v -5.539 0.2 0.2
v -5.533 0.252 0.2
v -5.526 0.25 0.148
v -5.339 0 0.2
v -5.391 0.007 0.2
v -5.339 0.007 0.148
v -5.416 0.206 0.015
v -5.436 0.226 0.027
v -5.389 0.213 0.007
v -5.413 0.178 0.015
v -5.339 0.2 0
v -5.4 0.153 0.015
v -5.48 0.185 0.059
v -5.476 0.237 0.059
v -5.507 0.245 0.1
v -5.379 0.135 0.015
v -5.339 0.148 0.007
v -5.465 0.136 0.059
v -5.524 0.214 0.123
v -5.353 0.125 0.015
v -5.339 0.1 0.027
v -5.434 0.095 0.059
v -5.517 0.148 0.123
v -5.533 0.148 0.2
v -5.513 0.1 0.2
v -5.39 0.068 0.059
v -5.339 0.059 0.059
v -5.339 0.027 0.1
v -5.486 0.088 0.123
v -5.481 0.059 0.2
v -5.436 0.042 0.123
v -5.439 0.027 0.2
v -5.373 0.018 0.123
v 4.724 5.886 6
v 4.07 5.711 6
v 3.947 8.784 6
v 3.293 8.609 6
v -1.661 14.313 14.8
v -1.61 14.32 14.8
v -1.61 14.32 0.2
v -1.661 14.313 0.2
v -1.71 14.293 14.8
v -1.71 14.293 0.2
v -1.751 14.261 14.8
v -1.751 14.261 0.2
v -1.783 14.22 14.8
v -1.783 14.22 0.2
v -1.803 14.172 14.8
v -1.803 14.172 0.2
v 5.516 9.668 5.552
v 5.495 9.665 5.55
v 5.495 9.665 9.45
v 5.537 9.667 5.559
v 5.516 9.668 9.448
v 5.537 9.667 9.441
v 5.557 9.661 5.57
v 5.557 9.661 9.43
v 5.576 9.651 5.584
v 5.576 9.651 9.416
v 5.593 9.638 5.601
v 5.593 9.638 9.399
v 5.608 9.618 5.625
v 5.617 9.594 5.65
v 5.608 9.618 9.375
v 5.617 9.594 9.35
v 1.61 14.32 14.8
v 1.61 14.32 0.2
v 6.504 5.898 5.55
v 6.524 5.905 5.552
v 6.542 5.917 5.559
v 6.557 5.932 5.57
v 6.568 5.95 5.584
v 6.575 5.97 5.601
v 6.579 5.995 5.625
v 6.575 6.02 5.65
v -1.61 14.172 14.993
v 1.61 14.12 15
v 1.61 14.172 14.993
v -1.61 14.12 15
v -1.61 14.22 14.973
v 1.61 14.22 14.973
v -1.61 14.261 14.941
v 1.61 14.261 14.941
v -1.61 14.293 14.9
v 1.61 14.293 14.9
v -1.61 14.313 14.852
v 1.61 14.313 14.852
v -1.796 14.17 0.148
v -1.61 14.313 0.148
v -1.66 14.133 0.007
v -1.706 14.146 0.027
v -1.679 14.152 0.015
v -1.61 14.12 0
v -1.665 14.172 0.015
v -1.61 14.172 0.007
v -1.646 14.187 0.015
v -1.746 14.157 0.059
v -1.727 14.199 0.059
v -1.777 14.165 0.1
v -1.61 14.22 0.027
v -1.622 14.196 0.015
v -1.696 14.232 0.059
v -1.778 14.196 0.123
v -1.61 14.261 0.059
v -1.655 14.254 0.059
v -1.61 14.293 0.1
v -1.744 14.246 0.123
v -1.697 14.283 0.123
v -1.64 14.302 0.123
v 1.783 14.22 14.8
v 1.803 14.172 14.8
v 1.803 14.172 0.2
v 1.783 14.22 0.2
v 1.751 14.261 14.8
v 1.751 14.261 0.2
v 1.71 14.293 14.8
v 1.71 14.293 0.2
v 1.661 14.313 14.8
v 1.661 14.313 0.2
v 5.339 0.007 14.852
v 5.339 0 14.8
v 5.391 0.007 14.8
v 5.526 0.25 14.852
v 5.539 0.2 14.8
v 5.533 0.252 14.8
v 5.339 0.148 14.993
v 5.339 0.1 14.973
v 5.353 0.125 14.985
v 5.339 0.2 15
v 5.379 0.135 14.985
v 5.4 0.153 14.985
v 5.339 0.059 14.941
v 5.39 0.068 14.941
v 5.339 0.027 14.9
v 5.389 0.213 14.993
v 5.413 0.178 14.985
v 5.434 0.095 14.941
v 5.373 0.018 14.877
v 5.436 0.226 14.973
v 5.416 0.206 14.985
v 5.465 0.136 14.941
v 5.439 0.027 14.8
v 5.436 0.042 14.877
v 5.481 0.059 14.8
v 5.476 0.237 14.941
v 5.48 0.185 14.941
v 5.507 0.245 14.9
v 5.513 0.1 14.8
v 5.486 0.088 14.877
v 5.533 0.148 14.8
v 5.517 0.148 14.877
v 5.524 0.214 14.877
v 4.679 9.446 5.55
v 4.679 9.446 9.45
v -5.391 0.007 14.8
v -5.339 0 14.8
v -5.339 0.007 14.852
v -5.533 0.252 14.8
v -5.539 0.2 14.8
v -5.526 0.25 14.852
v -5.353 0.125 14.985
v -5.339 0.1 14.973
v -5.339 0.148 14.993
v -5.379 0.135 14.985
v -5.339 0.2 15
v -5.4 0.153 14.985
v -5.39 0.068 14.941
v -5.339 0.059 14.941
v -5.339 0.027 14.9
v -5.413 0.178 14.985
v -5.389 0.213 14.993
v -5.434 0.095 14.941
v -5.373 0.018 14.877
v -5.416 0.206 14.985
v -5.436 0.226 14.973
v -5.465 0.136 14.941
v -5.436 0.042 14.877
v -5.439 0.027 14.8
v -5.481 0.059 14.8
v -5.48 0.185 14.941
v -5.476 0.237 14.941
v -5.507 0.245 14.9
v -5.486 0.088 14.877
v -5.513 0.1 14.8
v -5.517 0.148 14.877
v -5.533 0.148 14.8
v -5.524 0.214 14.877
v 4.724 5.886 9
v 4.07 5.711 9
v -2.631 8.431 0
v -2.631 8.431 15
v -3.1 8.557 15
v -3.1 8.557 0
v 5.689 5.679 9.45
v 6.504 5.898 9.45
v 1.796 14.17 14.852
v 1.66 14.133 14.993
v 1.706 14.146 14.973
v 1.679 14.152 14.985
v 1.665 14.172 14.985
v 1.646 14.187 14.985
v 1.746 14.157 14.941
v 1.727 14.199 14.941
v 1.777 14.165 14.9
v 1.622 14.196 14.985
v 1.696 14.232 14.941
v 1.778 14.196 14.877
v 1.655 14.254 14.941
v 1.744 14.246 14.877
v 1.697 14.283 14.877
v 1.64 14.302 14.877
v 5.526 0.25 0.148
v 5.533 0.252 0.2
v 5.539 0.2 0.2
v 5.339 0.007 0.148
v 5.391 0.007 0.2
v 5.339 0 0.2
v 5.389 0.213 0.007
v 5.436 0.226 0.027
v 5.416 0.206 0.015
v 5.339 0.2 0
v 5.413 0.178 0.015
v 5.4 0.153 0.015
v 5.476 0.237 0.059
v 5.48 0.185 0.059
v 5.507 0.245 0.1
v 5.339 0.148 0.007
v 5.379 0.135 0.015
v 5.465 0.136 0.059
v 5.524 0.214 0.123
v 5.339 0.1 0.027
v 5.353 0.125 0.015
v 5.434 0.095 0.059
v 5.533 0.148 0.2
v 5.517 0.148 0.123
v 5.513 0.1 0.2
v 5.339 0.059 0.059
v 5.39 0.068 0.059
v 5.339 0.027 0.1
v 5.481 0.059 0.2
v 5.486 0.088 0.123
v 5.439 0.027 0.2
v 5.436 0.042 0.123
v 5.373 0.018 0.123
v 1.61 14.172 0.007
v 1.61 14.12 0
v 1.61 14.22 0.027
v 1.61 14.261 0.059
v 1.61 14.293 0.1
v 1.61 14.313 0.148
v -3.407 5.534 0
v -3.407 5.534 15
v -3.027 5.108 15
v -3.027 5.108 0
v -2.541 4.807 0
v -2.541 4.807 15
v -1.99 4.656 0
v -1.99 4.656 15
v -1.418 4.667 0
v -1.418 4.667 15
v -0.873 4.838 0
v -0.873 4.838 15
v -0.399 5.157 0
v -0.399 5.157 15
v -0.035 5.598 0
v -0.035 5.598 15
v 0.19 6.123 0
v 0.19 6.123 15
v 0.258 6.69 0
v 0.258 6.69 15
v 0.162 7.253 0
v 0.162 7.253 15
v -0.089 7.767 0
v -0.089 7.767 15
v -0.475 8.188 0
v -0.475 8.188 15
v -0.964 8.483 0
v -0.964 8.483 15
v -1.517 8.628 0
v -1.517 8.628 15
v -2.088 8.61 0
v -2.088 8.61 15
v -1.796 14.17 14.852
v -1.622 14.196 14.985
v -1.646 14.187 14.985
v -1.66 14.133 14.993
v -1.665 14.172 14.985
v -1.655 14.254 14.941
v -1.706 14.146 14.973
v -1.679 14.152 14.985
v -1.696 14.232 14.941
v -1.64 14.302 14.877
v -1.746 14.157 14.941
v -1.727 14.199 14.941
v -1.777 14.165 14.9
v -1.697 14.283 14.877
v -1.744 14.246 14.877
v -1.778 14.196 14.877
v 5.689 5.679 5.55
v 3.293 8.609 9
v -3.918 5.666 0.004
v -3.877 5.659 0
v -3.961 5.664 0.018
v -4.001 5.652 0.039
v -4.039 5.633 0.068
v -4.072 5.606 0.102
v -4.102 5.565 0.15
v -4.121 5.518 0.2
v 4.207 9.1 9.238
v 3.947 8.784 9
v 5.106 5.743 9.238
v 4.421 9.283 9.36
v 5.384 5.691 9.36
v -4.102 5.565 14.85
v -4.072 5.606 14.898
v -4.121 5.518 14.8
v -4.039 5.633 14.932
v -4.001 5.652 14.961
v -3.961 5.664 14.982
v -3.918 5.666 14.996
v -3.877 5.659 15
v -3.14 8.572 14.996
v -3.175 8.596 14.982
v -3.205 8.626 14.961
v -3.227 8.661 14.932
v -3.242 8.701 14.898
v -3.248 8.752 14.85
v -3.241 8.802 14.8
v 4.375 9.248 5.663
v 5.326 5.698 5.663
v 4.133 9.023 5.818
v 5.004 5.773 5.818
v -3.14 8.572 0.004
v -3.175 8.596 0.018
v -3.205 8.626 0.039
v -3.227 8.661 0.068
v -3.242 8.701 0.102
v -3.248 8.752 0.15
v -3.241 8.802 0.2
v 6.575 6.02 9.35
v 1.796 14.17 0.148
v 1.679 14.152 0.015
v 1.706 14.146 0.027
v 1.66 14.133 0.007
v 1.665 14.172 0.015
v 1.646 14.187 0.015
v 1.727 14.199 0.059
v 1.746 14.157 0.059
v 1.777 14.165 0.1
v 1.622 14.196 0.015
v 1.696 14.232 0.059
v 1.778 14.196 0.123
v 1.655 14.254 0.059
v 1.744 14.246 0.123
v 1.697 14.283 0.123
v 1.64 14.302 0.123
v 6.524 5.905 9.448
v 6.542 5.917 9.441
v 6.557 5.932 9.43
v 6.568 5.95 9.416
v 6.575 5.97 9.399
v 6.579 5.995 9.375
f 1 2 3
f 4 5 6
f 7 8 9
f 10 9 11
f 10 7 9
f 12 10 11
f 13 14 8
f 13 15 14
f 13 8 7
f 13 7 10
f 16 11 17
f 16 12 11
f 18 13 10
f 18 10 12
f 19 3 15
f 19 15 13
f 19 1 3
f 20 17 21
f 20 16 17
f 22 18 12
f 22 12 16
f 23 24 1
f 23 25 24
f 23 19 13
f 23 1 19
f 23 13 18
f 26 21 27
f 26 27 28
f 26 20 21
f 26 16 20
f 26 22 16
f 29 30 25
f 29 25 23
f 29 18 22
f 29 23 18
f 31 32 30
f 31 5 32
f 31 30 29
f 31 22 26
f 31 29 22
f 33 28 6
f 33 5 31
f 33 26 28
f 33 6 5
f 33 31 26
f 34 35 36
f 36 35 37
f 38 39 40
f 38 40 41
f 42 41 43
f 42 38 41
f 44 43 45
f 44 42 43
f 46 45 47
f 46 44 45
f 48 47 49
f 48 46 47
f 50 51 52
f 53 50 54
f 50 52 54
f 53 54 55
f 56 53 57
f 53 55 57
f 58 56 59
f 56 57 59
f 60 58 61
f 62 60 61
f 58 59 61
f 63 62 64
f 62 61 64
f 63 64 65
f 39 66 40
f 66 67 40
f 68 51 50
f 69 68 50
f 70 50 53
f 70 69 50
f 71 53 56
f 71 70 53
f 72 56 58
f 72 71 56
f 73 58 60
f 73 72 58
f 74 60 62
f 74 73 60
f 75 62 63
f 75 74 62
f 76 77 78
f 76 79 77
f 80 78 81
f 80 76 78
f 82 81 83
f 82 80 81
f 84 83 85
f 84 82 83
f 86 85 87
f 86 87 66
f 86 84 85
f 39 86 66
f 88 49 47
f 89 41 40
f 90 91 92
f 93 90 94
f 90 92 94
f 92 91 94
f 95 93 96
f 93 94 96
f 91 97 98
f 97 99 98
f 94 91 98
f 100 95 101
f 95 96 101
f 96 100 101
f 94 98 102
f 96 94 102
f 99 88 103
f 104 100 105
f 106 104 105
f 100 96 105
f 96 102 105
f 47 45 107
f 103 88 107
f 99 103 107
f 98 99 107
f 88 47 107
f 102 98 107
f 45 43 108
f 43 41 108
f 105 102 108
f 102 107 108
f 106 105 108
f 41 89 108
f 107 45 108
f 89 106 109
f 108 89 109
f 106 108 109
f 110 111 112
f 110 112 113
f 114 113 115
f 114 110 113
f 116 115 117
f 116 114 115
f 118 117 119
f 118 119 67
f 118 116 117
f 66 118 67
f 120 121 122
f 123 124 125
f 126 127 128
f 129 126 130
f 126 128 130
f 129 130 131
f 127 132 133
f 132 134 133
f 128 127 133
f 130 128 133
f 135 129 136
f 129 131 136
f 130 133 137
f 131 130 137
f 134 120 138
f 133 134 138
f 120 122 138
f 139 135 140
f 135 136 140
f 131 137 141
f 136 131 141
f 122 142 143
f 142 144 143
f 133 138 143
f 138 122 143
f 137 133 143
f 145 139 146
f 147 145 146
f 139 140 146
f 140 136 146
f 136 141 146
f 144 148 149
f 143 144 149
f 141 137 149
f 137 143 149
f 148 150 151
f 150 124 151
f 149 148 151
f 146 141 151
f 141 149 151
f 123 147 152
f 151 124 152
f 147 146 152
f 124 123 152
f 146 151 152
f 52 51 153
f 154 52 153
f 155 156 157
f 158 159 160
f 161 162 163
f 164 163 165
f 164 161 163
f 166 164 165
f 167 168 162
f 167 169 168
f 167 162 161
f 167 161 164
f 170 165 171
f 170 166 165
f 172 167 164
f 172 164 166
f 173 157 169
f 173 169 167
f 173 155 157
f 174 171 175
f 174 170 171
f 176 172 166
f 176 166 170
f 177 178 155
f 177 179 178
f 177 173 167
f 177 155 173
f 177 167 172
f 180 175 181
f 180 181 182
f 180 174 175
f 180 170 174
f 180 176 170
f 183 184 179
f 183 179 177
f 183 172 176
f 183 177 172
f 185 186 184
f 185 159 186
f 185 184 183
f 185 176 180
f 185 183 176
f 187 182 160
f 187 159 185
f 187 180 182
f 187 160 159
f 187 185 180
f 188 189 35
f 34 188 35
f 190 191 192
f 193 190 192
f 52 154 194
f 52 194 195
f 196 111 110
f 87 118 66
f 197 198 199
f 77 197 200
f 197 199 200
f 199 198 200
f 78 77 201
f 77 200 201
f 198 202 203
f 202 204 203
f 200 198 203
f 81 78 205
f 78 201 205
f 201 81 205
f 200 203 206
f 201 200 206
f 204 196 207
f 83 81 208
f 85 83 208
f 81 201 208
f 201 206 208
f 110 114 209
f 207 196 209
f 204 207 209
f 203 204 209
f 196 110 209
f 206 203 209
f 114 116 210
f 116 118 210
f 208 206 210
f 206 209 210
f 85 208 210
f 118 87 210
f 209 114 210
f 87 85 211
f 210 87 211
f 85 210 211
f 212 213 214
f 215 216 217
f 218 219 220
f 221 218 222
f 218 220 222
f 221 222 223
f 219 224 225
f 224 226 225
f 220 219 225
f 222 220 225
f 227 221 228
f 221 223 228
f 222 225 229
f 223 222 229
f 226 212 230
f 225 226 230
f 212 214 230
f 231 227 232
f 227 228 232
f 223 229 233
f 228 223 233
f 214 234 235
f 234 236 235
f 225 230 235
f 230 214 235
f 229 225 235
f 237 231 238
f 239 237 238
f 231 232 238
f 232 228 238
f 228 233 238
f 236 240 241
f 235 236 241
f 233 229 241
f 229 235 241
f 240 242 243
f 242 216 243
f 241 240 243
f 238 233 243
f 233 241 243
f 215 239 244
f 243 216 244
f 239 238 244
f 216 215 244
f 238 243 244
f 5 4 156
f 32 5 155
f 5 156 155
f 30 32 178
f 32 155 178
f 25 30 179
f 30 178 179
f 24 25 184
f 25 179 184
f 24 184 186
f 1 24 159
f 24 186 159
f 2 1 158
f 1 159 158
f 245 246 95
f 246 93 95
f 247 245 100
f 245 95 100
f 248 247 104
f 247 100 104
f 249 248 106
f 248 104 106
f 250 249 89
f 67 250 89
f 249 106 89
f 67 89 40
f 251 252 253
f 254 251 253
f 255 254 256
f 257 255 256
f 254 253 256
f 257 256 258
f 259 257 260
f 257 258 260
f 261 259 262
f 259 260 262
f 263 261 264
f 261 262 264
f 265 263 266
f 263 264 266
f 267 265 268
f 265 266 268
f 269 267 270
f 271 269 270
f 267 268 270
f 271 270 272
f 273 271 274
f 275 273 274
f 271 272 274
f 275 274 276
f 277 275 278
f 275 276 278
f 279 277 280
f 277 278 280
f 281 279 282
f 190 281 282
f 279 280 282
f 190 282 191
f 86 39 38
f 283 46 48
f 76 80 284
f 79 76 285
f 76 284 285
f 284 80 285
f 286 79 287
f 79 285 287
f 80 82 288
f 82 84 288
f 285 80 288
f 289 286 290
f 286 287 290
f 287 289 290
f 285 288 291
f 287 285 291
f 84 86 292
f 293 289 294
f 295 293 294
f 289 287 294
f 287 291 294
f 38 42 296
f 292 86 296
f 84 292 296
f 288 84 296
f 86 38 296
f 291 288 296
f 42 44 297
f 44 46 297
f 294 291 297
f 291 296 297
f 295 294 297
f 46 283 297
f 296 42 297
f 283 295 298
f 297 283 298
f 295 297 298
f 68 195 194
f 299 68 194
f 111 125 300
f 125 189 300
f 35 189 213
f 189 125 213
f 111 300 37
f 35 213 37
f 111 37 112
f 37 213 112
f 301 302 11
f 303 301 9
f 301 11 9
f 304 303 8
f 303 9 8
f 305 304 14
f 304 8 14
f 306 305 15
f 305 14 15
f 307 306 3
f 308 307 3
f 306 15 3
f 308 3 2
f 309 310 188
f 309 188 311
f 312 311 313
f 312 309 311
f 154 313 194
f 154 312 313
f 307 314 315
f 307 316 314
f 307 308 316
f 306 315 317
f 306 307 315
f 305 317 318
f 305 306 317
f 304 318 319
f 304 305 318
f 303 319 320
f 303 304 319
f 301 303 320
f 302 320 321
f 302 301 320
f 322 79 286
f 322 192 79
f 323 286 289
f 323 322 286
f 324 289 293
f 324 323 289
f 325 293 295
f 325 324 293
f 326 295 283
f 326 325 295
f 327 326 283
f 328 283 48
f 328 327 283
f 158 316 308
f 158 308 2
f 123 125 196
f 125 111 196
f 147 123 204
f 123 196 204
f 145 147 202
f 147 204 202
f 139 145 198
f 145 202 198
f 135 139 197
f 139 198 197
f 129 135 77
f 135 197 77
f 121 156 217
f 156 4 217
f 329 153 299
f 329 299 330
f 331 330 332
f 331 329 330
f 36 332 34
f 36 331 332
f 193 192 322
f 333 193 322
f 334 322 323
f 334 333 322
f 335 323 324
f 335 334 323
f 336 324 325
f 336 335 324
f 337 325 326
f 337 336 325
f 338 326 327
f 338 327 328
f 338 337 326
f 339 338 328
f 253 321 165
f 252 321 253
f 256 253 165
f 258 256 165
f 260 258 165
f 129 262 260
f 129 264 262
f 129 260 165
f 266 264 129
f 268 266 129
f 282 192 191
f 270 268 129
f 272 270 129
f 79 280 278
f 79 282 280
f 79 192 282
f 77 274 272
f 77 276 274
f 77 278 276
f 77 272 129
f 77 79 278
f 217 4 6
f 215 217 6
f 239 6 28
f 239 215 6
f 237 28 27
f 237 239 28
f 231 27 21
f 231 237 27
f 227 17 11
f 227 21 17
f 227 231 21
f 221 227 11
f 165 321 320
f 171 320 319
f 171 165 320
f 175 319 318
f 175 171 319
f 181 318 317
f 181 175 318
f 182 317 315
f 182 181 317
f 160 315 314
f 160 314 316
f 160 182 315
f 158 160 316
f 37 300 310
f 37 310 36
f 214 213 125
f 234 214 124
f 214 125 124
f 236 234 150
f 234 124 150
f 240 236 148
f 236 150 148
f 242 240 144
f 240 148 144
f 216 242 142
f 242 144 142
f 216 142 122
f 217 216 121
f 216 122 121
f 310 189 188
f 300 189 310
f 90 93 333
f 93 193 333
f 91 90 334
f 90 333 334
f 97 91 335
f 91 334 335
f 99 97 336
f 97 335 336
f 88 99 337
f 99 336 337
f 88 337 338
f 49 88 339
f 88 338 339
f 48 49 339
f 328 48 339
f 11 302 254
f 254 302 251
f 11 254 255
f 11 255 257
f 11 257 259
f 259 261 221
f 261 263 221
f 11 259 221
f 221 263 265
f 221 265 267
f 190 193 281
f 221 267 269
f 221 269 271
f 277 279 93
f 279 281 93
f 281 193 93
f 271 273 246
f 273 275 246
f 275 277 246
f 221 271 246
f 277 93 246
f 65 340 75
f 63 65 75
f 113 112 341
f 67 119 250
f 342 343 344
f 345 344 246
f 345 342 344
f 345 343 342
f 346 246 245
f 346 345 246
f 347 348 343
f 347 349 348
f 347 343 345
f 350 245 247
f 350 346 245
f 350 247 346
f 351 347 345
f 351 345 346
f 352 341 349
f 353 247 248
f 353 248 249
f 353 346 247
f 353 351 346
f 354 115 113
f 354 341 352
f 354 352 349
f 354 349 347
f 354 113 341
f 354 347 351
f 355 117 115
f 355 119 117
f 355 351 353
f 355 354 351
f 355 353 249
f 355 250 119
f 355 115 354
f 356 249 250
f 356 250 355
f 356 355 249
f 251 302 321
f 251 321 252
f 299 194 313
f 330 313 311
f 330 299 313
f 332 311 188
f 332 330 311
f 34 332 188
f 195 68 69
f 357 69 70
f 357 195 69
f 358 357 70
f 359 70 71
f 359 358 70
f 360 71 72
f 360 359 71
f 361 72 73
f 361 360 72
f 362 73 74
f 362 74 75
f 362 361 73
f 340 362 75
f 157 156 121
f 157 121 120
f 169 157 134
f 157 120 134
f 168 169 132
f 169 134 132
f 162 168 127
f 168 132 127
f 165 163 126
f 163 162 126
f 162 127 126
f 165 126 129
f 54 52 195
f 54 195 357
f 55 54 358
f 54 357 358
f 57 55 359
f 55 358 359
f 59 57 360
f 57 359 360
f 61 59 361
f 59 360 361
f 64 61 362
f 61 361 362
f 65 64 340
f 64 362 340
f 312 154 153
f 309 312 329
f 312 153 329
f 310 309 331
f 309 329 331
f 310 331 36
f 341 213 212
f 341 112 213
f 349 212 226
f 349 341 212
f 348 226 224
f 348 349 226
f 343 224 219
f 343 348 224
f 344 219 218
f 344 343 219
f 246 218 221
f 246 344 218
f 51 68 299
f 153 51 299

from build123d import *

# Parameters (mm, degrees)
EXTRUDE_1_DEPTH           = 15
CUT_EXTRUDE_1_DEPTH       = 15
SKETCH_5_W                = 3
SKETCH_5_H                = 3
EXTRUDE_2_DEPTH           = 0.68
EXTRUDE_3_DEPTH           = 5
EXTRUDE_3_DEPTH_BACK      = 5
CUT_EXTRUDE_11_DEPTH      = 5
CUT_EXTRUDE_11_DEPTH_BACK = 5
FILLET_1_R                = 0.2
FILLET_5_R                = 0.1


with BuildPart() as part:
    # 草图1 → 凸台-拉伸1 (new body)
    with BuildSketch(Plane.XY):
        Polygon((-5.6, 0), (5.6, 0), (1.762967564, 14.32), (-1.762967564, 14.32), align=None)
    extrude(amount=EXTRUDE_1_DEPTH)

    # 草图2 → 切除-拉伸1 (cut)
    with BuildSketch(Plane.XY.offset(15)):
        with BuildLine():
            Line((-3.681483782, 7.16), (-4.06971235, 5.711111261))
            Line((-4.06971235, 5.711111261), (-3.407492768, 5.533670058))
            ThreePointArc((-3.407492768, 5.533670058), (0.190360002, 6.122701516), (-2.631169509, 8.431483409))
            Line((-2.631169509, 8.431483409), (-3.293255215, 8.608888739))
            Line((-3.293255215, 8.608888739), (-3.681483782, 7.16))
        make_face()
    extrude(amount=-CUT_EXTRUDE_1_DEPTH, mode=Mode.SUBTRACT)

    # 草图5 → 凸台-拉伸2 (add)
    with BuildSketch(Plane(origin=(5.224871131, 1.4, 0), x_dir=(0, 0, -1), z_dir=(0.9659258262890671, 0.2588190451025256, 0))):
        with Locations((-7.5, 5.963190799)):
            Rectangle(SKETCH_5_W, SKETCH_5_H)
    extrude(amount=EXTRUDE_2_DEPTH)

    # 草图6 → 凸台-拉伸3 (add, two sides: drawn at the far end of the back side and taken through both)
    with BuildSketch(Plane(origin=(-1.155158781, 4.311111261, 0), x_dir=(0.965925826289067, 0.2588190451025257, 0), z_dir=(0.2588190451025257, -0.965925826289067, 0)).offset(-EXTRUDE_3_DEPTH_BACK)):
        with BuildLine():
            Line((7.909184627, 5.55), (6.964774906, 5.55))
            ThreePointArc((6.964774906, 5.55), (6.497346154, 5.719957697), (6.086308972, 6))
            Line((6.086308972, 6), (6.086308972, 9))
            ThreePointArc((6.086308972, 9), (6.497346154, 9.280042303), (6.964774906, 9.45))
            Line((6.964774906, 9.45), (7.909184627, 9.45))
            Line((7.909184627, 9.45), (7.909184627, 5.55))
        make_face()
    extrude(amount=EXTRUDE_3_DEPTH + EXTRUDE_3_DEPTH_BACK)

    # 草图7 → 切除-拉伸11 (cut, two sides: drawn at the far end of the back side and taken through both)
    with BuildSketch(Plane.XY.offset(9).offset(-CUT_EXTRUDE_11_DEPTH_BACK)):
        with BuildLine():
            Line((5.59160121, 9.690602974), (4.67937147, 9.446171752))
            ThreePointArc((4.67937147, 9.446171752), (4.271858255, 9.16102576), (3.947307106, 8.784141416))
            Line((3.947307106, 8.784141416), (3.429669016, 10.715993068))
            Line((3.429669016, 10.715993068), (4.27820195, 10.943356783))
            Line((4.27820195, 10.943356783), (5.19043169, 11.187788005))
            Line((5.19043169, 11.187788005), (5.59160121, 9.690602974))
        make_face()
        with BuildLine():
            Line((6.600995486, 5.923492251), (5.688765746, 5.679061029))
            ThreePointArc((5.688765746, 5.679061029), (5.193275954, 5.722248095), (4.723764242, 5.886363937))
            Line((4.723764242, 5.886363937), (6.017859467, 1.056734805))
            Line((6.017859467, 1.056734805), (6.866392401, 1.28409852))
            Line((6.866392401, 1.28409852), (7.778622141, 1.528529742))
            Line((7.778622141, 1.528529742), (6.600995486, 5.923492251))
        make_face()
    extrude(amount=CUT_EXTRUDE_11_DEPTH + CUT_EXTRUDE_11_DEPTH_BACK, mode=Mode.SUBTRACT)

    # 圆角1
    fillet_1_edges = [part.edges().sort_by_distance(p)[0] for p in [
        (0, 0, 15),
        (3.681483782, 7.16, 15),
        (-4.834856175, 2.85555563, 0),
        (-4.834856175, 2.85555563, 15),
        (-3.293255215, 8.608888739, 7.5),
        (-4.06971235, 5.711111261, 7.5),
        (0, 14.32, 15),
        (3.681483782, 7.16, 0),
        (0, 0, 0),
        (-2.528111389, 11.46444437, 0),
        (0, 14.32, 0),
        (-2.528111389, 11.46444437, 15),
        (1.762967564, 14.32, 7.5),
        (5.6, 0, 7.5),
        (-5.6, 0, 7.5),
        (-1.762967564, 14.32, 7.5),
    ]]
    fillet(fillet_1_edges, radius=FILLET_1_R)

    # 圆角5
    fillet_5_edges = [part.edges().sort_by_distance(p)[0] for p in [
        (6.096298348, 7.807047613, 9.45),
        (6.096298348, 7.807047613, 5.55),
        (5.59160121, 9.690602974, 7.5),
        (6.600995486, 5.923492251, 7.5),
    ]]
    fillet(fillet_5_edges, radius=FILLET_5_R)


solid = part.part
